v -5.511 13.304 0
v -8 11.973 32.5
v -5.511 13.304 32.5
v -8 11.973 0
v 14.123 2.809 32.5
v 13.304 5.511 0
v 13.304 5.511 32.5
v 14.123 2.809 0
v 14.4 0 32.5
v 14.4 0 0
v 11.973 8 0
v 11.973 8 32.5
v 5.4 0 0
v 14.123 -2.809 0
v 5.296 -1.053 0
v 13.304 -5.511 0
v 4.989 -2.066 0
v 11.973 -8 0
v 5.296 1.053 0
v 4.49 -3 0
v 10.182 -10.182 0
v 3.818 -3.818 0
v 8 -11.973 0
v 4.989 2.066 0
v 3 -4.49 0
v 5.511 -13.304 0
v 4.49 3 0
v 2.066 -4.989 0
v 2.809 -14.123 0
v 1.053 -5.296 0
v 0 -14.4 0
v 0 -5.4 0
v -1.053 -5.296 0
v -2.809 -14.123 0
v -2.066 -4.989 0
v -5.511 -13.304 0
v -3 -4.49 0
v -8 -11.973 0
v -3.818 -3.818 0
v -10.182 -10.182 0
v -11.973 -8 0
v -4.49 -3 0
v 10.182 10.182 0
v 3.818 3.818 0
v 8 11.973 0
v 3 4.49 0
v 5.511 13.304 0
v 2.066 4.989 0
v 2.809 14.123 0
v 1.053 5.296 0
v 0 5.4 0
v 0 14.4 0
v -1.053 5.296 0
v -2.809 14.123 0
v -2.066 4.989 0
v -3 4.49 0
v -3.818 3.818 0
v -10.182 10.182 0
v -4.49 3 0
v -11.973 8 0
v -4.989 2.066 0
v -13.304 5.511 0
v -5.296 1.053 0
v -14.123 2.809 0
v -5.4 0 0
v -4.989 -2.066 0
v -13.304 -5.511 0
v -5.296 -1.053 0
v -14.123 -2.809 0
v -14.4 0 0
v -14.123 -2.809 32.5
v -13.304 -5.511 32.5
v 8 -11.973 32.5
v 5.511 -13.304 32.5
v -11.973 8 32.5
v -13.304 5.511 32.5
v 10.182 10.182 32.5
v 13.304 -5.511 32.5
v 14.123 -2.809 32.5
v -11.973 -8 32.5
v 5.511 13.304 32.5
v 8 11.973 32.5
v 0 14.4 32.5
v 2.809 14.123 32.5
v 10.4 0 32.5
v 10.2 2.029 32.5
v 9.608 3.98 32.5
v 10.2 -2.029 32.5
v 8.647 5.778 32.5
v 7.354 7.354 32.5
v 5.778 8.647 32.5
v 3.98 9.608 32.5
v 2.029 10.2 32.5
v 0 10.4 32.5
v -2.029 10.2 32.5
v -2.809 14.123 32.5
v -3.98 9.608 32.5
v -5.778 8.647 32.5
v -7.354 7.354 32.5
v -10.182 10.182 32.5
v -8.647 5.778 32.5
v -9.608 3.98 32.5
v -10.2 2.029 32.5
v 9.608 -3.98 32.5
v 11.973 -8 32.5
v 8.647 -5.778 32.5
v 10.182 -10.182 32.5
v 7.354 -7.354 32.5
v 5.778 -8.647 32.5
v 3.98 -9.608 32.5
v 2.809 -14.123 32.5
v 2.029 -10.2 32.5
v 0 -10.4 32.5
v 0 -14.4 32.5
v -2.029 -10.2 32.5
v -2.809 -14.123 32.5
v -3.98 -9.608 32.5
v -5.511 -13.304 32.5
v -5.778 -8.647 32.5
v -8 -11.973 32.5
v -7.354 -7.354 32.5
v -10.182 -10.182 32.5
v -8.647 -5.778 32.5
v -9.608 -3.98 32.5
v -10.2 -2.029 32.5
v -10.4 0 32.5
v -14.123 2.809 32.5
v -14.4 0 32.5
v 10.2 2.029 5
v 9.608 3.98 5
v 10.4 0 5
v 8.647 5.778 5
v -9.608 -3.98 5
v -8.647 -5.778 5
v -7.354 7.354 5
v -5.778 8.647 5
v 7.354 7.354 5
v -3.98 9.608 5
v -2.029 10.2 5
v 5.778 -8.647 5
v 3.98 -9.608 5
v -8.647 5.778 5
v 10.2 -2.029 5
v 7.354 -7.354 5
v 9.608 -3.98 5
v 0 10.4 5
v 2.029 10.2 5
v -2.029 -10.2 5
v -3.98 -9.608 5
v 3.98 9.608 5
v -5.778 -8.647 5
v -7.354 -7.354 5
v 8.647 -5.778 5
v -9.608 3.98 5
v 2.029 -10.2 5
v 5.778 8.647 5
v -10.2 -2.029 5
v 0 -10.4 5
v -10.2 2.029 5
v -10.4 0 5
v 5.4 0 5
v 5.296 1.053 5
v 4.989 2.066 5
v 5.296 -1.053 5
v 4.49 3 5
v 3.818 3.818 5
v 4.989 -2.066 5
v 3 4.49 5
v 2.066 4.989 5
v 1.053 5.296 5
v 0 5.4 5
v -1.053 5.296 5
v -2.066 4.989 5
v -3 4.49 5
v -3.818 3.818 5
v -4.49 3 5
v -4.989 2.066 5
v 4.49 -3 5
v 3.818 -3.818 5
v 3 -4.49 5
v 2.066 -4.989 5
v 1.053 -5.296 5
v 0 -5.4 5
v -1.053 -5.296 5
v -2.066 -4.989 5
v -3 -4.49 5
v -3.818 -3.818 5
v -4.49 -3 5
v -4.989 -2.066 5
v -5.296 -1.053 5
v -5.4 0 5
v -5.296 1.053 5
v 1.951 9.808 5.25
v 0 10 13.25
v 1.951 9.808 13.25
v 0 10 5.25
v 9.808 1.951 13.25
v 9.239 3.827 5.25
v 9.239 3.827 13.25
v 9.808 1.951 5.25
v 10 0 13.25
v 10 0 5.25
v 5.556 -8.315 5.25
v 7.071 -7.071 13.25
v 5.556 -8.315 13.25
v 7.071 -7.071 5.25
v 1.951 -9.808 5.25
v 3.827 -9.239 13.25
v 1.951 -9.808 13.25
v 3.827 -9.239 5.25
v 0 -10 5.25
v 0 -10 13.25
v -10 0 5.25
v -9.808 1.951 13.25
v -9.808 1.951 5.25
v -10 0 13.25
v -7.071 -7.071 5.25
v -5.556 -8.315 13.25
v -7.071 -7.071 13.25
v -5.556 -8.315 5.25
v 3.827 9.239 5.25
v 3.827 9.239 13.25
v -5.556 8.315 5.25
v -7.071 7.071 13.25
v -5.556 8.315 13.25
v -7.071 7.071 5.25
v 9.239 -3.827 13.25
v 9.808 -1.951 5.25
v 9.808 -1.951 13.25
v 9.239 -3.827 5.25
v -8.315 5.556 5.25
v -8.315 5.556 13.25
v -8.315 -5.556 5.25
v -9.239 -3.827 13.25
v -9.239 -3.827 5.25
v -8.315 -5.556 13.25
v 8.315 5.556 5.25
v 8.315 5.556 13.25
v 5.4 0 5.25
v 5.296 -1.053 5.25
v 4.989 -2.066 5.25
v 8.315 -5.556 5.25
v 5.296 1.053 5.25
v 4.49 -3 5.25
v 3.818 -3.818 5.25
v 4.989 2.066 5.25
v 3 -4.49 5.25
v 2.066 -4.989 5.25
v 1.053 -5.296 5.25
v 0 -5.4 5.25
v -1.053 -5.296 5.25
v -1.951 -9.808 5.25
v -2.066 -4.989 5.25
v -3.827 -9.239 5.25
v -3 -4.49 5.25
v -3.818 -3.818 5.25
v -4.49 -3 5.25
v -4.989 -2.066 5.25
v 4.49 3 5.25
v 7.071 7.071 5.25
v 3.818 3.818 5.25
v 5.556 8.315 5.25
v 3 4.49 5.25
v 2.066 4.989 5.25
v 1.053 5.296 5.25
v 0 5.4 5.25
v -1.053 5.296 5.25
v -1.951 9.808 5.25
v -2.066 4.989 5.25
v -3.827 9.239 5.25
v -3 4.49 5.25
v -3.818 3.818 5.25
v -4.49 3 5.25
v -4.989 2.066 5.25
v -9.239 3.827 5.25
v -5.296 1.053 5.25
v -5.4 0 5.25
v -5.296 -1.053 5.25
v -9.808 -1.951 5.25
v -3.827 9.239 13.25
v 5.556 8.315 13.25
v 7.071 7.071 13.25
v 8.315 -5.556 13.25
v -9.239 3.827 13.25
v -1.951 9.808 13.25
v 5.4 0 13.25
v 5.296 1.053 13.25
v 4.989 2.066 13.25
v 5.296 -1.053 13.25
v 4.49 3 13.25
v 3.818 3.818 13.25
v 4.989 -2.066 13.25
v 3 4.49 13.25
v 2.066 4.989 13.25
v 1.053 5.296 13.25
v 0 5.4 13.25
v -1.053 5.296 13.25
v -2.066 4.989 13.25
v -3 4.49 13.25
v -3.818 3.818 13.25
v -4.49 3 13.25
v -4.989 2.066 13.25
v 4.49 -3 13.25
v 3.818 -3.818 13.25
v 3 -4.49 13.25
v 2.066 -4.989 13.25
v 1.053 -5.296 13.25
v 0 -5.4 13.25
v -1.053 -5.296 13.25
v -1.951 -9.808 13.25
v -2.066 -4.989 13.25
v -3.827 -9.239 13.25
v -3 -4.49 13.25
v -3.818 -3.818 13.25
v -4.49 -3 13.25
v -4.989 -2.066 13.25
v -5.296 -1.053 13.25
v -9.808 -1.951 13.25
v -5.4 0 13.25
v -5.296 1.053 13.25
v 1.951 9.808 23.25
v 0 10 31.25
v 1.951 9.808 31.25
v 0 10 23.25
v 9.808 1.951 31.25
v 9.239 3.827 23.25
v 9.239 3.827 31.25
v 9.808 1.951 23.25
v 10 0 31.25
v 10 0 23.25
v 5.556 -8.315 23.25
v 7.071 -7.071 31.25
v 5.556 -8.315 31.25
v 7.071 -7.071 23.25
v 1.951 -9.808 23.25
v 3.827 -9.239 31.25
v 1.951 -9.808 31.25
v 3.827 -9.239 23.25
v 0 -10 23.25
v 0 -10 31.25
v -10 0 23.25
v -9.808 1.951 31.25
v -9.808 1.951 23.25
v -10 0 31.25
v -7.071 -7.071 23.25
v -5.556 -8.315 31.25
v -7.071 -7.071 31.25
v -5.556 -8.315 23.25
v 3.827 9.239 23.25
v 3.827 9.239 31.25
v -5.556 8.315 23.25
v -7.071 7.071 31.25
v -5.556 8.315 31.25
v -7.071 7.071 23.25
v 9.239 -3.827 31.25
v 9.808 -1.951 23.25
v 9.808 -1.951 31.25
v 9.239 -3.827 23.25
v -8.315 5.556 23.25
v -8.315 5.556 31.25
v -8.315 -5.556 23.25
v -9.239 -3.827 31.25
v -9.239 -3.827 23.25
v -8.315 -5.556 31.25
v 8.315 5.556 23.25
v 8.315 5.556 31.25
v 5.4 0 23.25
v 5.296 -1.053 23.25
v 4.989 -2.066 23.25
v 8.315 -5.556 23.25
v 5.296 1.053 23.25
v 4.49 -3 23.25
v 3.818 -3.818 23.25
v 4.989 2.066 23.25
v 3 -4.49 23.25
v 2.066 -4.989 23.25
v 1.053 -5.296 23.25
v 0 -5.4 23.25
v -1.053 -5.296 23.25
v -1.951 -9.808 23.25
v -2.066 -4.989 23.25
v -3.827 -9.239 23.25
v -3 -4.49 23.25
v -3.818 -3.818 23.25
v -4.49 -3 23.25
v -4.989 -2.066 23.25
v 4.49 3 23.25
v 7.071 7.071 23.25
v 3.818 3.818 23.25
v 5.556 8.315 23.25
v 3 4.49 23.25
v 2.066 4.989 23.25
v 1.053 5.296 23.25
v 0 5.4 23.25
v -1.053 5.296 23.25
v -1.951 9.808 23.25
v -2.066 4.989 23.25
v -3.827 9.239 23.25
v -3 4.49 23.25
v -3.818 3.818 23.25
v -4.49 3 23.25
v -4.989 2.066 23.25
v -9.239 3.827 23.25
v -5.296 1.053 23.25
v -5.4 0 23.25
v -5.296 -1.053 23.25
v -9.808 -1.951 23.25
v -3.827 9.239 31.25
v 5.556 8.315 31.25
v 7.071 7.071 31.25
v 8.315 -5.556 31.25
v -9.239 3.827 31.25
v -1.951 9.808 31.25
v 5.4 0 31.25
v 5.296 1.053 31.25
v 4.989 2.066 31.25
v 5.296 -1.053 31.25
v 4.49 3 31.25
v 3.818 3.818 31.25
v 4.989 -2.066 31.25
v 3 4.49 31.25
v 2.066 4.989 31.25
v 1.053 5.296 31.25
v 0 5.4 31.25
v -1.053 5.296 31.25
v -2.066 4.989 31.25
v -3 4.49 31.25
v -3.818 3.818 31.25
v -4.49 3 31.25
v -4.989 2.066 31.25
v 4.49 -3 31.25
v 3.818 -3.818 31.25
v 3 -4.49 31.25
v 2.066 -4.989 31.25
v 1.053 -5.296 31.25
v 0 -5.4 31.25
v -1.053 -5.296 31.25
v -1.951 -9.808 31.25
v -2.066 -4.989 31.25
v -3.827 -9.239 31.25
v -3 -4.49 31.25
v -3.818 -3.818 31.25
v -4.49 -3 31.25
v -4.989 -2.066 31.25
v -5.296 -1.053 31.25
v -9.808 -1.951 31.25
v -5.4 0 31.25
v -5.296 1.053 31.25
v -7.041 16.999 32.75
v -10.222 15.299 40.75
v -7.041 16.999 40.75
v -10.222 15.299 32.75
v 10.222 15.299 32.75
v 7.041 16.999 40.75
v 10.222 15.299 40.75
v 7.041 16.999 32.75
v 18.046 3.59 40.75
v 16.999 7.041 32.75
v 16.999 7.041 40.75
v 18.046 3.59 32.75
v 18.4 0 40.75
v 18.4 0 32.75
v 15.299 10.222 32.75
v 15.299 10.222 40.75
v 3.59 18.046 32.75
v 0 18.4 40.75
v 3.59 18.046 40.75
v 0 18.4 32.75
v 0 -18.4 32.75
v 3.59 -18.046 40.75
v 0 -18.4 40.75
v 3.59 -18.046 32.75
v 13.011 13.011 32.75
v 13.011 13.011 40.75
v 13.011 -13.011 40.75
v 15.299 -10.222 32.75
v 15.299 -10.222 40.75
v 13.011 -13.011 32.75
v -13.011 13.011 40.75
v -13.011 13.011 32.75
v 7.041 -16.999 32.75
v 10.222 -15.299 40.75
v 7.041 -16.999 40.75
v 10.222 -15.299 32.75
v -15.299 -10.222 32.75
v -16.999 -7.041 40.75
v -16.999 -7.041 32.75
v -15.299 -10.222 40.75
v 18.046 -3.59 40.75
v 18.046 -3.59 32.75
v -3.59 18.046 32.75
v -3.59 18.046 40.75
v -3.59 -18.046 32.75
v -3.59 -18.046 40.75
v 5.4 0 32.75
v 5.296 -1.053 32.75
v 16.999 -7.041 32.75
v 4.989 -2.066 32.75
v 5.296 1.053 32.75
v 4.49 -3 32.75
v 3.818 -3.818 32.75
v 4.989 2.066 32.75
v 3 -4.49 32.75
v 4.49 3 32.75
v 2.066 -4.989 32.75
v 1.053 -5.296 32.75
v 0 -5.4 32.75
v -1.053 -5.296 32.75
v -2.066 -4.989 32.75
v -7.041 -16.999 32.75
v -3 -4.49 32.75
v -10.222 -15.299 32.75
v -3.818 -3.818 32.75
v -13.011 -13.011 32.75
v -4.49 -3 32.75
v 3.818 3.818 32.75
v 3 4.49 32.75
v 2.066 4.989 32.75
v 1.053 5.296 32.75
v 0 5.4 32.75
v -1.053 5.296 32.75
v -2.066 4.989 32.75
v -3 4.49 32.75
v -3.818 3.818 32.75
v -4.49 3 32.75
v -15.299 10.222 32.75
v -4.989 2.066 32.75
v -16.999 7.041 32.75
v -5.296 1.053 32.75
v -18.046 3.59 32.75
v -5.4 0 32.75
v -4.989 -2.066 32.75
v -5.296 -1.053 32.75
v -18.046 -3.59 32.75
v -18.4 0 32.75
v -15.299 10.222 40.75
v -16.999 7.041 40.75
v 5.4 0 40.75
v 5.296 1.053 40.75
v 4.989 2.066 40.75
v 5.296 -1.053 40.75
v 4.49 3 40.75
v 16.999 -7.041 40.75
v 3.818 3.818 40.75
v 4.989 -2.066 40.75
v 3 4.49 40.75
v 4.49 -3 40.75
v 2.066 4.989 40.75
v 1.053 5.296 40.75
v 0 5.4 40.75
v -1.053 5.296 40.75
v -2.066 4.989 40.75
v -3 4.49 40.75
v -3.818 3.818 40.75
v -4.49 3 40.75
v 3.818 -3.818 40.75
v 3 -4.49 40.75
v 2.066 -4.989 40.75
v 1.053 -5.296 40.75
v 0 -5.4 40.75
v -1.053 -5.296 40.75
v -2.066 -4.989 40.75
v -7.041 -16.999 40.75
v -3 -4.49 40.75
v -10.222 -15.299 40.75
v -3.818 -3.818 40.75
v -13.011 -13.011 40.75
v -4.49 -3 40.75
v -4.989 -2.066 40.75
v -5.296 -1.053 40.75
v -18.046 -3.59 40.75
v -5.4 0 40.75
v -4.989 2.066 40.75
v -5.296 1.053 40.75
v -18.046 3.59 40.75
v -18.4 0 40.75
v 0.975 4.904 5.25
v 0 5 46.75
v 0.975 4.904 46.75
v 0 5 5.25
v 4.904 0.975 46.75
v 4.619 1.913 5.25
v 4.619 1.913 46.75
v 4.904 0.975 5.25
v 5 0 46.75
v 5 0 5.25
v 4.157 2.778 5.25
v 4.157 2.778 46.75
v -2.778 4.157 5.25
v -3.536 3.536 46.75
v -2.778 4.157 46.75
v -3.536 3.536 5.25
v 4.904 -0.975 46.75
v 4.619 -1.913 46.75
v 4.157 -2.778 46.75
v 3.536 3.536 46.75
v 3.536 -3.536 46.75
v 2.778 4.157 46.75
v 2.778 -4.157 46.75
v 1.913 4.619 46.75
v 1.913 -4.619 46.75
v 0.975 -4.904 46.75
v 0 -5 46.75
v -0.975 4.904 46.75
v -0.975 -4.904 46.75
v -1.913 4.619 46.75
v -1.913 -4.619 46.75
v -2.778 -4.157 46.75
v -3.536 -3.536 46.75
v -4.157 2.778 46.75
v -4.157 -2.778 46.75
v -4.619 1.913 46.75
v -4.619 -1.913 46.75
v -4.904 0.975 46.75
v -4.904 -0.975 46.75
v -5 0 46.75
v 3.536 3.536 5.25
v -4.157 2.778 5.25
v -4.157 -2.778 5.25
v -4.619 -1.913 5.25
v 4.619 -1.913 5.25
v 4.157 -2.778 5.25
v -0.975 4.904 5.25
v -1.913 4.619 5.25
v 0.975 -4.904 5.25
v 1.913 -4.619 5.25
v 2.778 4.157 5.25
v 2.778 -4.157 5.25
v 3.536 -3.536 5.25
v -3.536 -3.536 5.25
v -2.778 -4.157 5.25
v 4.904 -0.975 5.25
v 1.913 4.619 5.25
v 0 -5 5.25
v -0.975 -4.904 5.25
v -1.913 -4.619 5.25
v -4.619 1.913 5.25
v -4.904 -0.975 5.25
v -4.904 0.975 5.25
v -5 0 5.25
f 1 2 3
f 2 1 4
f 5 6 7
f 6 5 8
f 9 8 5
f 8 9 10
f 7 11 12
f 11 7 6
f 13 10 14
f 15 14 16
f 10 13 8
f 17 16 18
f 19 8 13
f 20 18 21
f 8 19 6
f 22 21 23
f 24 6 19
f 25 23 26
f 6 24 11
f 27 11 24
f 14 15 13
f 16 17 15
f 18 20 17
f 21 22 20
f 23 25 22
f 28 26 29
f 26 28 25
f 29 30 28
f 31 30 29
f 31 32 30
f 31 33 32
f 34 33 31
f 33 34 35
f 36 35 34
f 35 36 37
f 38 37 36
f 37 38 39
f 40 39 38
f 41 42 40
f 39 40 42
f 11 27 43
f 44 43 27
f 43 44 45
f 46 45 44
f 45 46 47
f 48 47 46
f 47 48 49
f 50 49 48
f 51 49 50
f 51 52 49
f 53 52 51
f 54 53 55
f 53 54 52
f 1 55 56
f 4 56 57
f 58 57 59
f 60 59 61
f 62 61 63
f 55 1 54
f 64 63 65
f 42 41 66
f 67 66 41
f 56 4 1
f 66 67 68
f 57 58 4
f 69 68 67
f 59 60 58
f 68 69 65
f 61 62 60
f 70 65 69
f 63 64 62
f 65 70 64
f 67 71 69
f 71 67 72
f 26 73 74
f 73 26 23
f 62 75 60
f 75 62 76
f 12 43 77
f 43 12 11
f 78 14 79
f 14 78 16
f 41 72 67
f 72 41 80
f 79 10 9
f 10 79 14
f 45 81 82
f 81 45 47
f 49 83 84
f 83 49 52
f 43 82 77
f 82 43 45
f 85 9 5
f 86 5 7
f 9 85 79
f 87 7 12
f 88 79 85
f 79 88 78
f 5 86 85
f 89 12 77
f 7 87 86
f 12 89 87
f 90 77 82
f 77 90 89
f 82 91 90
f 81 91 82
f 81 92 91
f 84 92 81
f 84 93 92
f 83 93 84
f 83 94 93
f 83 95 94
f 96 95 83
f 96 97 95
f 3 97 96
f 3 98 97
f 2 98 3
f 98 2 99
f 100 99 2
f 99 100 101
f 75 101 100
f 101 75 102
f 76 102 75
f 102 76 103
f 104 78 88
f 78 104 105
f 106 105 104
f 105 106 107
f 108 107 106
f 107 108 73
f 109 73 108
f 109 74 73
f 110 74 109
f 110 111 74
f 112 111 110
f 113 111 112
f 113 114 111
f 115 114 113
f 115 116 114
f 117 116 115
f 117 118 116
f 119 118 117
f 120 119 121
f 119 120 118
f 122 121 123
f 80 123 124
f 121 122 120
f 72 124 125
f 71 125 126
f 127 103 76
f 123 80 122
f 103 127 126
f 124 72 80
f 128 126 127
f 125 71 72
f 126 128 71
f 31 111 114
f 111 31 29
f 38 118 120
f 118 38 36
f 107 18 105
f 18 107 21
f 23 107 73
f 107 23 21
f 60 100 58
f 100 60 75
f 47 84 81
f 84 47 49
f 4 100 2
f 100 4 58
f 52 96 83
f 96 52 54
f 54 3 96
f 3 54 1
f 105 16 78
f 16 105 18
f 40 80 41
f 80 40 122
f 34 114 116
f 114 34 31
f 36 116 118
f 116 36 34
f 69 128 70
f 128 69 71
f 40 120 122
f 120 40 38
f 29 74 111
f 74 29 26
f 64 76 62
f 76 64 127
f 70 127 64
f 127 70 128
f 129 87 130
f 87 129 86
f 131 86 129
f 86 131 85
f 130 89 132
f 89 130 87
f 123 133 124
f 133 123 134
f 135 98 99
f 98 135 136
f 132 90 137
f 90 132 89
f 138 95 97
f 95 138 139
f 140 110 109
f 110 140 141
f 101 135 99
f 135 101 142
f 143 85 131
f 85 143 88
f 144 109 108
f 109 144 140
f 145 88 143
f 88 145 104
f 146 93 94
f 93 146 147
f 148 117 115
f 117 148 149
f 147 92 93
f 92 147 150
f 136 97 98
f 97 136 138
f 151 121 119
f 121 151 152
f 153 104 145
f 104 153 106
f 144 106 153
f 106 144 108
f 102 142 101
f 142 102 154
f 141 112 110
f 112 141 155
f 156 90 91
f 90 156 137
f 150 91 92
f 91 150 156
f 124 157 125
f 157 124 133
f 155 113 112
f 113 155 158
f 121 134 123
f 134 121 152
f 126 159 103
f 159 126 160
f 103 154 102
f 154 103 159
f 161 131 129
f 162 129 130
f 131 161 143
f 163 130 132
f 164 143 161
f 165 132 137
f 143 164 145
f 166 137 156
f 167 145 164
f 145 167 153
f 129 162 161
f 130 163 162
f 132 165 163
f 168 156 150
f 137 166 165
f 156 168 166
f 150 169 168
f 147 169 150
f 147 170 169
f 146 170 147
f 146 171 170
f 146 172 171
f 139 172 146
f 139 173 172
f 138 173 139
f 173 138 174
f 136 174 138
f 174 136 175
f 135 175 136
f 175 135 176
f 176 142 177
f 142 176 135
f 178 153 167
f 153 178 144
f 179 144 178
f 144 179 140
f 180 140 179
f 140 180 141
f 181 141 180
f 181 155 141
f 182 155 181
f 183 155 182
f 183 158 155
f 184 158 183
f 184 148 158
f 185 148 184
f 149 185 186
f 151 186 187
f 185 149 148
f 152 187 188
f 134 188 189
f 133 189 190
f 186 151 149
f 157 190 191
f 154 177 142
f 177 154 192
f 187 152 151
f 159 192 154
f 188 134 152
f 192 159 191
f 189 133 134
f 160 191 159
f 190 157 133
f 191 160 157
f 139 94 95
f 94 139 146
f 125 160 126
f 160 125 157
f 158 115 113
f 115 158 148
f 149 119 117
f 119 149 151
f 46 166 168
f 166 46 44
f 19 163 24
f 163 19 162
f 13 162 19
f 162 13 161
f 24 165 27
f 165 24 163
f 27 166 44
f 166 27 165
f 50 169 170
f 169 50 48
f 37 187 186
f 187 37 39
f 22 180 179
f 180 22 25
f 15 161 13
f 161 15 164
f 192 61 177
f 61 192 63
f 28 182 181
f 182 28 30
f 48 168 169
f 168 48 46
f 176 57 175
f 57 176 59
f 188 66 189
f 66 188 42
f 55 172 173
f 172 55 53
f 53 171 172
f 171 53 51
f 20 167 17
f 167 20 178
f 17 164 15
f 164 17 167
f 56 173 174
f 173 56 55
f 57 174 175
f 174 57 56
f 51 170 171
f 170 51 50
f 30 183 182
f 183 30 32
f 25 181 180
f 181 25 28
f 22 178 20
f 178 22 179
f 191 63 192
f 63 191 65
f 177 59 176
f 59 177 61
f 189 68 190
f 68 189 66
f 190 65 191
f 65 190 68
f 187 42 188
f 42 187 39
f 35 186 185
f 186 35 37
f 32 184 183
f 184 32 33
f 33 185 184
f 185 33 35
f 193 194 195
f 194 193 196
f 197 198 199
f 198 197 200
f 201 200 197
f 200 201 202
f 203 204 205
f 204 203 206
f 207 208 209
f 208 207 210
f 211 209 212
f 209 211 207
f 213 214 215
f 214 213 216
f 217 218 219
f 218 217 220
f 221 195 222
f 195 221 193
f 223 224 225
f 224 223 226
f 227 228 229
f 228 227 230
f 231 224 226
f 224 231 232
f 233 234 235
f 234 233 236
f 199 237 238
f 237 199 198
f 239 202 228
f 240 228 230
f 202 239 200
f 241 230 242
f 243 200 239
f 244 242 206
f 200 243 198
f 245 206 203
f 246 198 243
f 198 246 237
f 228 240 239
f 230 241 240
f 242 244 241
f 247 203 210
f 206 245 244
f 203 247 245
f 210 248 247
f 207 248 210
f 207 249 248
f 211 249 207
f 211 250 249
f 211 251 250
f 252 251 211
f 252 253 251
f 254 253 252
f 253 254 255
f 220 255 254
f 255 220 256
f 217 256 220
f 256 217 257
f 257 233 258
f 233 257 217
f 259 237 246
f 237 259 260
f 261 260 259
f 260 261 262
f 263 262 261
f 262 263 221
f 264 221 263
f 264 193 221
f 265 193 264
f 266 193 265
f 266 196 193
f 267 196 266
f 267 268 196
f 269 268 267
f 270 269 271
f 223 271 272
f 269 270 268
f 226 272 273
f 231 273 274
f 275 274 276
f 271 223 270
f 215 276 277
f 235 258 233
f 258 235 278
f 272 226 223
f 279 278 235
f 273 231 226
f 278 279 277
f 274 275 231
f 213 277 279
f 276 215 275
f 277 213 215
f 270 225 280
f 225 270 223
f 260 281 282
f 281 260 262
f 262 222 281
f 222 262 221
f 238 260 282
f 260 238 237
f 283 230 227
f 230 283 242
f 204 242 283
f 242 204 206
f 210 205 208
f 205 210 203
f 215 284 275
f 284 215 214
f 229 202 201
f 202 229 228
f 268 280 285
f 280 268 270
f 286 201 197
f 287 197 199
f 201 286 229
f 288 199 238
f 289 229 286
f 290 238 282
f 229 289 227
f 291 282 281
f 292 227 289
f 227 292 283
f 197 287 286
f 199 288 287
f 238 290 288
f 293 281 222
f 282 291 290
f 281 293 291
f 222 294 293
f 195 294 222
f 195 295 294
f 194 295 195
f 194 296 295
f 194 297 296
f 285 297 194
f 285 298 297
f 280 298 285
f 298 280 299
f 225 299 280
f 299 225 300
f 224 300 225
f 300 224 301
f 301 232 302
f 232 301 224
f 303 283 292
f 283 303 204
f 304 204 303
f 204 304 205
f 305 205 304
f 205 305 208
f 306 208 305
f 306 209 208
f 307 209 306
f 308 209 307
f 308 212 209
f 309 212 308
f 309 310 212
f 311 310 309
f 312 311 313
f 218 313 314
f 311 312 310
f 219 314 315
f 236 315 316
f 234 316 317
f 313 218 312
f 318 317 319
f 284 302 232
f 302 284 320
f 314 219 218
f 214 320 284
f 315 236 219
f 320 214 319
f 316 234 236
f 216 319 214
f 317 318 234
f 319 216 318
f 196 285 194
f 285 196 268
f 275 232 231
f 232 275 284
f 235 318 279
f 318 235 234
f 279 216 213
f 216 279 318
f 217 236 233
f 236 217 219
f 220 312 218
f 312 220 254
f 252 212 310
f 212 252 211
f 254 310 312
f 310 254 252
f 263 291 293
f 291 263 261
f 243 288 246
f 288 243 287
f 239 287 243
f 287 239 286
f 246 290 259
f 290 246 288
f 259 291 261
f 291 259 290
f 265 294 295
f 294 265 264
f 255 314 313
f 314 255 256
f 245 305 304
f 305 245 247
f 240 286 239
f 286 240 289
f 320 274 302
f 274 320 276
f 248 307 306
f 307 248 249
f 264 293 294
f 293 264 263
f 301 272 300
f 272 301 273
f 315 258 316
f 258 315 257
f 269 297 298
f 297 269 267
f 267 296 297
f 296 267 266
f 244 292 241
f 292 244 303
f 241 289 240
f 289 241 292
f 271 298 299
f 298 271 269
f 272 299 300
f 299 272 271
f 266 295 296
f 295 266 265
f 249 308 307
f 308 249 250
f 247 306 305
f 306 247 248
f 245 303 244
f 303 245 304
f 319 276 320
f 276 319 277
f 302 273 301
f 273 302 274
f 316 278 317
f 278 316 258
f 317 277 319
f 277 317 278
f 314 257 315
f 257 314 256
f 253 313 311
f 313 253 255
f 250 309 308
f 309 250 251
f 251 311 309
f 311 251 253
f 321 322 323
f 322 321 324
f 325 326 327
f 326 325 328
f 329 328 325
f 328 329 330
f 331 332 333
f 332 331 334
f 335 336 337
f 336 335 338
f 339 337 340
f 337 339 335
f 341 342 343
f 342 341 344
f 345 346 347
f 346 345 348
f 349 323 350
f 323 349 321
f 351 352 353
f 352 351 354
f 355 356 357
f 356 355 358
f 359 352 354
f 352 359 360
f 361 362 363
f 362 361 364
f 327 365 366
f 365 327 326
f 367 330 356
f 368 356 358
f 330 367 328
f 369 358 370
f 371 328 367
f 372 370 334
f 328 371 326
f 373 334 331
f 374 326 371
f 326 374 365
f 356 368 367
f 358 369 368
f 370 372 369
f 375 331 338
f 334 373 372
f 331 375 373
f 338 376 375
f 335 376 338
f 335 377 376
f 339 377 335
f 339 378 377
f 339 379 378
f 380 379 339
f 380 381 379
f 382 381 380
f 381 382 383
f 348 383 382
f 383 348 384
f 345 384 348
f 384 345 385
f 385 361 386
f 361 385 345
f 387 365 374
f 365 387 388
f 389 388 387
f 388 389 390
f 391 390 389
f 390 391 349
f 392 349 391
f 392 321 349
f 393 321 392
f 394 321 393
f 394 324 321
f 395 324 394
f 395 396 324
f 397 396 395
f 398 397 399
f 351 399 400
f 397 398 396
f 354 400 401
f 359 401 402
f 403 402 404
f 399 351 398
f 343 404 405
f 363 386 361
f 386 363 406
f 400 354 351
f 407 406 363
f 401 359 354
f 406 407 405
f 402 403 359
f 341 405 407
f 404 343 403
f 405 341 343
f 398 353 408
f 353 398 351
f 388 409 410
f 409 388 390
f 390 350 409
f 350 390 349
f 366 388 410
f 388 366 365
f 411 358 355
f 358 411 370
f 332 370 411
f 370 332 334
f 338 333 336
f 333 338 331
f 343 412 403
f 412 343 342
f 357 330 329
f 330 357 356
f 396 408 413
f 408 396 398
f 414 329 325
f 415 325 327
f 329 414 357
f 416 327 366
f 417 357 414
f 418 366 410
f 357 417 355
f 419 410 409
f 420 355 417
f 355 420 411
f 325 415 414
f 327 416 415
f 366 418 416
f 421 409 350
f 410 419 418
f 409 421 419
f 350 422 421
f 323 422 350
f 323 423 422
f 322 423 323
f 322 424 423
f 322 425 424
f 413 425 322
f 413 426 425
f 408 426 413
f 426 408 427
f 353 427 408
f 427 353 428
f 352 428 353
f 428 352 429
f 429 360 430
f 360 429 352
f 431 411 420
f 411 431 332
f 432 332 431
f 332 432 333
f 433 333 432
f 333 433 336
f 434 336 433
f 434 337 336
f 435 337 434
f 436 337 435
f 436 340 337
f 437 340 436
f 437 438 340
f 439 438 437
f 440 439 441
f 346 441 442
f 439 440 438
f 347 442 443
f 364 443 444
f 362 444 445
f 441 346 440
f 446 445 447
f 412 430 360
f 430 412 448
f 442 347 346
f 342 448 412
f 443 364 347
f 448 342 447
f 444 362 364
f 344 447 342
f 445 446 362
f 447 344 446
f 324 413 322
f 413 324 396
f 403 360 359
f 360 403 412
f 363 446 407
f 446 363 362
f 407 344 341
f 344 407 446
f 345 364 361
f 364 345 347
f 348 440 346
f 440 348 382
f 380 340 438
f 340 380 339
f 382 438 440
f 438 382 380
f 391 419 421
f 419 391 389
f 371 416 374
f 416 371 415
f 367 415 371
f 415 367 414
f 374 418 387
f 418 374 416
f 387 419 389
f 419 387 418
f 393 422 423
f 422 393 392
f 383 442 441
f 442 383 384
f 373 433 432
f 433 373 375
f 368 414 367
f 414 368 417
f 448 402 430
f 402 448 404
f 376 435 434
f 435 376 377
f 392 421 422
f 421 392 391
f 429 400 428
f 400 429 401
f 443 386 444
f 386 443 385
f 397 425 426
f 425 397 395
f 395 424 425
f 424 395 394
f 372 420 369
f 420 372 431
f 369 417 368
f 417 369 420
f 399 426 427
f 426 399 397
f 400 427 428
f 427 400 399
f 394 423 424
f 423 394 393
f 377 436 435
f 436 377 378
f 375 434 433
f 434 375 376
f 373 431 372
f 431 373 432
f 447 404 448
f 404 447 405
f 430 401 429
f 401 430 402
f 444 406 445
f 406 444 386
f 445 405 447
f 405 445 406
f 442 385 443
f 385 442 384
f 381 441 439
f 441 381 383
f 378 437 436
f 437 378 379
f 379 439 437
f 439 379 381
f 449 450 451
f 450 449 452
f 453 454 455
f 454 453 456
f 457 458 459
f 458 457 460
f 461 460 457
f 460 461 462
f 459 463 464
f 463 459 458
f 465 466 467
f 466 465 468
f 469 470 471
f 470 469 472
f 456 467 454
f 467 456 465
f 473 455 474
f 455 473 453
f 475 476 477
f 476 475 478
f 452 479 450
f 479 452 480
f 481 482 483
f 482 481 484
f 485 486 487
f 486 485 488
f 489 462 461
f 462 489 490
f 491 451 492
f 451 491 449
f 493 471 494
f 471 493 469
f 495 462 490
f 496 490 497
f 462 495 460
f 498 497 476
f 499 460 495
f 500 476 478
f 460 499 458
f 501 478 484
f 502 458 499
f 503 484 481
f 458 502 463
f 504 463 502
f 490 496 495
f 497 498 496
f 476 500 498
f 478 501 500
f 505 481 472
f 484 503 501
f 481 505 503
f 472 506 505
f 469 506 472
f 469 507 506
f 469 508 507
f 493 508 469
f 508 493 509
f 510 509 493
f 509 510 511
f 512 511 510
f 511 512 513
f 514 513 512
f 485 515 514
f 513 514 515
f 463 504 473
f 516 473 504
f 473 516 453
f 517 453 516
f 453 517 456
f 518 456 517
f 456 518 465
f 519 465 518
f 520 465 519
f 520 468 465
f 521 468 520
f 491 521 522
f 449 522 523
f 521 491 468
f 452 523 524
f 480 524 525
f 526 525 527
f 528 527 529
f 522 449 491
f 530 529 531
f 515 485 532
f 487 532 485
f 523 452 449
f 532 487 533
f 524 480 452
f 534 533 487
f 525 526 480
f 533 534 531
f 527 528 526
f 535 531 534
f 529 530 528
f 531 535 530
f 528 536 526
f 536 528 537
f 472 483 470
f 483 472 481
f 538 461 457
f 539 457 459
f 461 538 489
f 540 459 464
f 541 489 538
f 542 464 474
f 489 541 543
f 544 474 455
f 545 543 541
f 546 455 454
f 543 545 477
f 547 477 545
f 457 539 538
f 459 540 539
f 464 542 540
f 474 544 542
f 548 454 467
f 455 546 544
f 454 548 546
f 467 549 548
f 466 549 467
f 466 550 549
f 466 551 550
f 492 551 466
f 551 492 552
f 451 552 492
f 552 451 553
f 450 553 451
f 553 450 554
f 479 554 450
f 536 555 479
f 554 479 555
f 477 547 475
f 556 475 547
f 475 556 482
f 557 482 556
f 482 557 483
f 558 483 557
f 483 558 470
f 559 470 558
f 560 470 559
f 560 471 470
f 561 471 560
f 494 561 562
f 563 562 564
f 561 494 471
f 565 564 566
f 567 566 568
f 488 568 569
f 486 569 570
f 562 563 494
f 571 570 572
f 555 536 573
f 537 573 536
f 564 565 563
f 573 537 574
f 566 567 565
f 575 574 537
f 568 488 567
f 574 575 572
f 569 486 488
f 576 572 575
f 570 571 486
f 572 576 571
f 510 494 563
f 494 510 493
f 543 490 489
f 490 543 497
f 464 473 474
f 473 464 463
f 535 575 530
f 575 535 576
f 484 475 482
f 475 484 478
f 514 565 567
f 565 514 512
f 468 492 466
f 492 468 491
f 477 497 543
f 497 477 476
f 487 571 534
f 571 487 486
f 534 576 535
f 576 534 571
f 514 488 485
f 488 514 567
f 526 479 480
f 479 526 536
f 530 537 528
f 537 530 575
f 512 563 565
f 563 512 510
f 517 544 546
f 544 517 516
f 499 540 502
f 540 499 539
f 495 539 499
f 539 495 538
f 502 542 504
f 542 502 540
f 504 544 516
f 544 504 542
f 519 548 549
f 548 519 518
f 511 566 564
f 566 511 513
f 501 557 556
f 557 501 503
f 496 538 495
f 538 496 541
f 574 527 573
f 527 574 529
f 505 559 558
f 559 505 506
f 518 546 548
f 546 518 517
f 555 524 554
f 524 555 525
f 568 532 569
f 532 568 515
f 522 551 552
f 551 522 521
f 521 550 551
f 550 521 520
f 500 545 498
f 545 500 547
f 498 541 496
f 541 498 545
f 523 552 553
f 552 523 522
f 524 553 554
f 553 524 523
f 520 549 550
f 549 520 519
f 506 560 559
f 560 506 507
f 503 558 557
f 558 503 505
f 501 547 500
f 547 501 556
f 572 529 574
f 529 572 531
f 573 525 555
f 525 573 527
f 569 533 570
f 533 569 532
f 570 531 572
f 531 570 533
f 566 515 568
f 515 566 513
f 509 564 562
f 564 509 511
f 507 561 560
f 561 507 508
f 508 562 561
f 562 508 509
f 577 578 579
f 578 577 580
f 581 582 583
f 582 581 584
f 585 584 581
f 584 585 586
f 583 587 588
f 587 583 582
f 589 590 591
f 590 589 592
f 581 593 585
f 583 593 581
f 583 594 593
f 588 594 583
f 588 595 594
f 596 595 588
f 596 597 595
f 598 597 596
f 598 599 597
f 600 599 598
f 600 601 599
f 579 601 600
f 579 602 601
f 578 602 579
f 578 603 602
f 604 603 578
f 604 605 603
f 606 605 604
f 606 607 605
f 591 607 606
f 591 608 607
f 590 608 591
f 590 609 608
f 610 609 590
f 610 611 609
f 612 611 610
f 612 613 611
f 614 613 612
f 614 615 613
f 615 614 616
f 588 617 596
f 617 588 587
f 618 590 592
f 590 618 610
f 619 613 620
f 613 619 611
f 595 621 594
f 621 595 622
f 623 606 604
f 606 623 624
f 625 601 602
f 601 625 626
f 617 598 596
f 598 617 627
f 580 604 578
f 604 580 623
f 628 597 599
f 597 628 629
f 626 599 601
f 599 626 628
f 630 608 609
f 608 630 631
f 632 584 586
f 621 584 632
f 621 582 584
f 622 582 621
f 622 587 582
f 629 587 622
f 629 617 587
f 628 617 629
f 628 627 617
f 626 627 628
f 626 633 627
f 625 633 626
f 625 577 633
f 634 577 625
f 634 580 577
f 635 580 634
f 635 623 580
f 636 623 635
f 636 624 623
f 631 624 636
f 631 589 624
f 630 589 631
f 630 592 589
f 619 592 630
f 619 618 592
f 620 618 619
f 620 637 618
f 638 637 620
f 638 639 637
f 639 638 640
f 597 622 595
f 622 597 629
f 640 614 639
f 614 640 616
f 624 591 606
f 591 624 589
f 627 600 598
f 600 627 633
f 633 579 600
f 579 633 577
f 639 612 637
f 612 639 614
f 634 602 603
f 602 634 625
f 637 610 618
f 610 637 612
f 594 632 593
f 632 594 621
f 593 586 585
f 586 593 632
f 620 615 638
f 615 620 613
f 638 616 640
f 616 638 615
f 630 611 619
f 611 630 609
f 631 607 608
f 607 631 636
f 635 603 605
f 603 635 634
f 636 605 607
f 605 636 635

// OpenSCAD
$fn = 32;

// ------------------------------------------------------------------------
// Shaft station: cup d28.8 x 32.5 mm, shaft d10
// Every part is its own module, assembly() places every instance.
// ------------------------------------------------------------------------

// --- part 1 ---
module housing_cup() {
  difference() {
    cylinder(h = 32.5, d = 28.8);
    translate([0, 0, 5]) cylinder(h = 28.5, d = 20.8);
    translate([0, 0, -1]) cylinder(h = 7, d = 10.8);
  }
}

// --- part 2 ---
module bearing_lower() {
  difference() {
      translate([0, 0, 0]) cylinder(h = 8, d = 20);
      translate([0, 0, -1]) cylinder(h = 10, d = 10.8);
    }
}

// --- part 3 ---
module bearing_upper() {
  difference() {
      translate([0, 0, 0]) cylinder(h = 8, d = 20);
      translate([0, 0, -1]) cylinder(h = 10, d = 10.8);
    }
}

// --- part 4 ---
module station_shaft() {
  translate([0, 0, -20.75]) cylinder(h = 41.5, d = 10);
}

// --- part 5 ---
module station_cover() {
  difference() {
    cylinder(h = 8, d = 36.8);
    translate([0, 0, -1]) cylinder(h = 10, d = 10.8);
  }
}

// --- assembly ---
module assembly() {
  color([0.80, 0.24, 0.20]) translate([0, 0, 0]) rotate([0, 0, 0]) housing_cup();
  color([0.20, 0.45, 0.75]) translate([0, 0, 5.25]) rotate([0, 0, 0]) bearing_lower();
  color([0.25, 0.62, 0.32]) translate([0, 0, 23.25]) rotate([0, 0, 0]) bearing_upper();
  color([0.92, 0.70, 0.18]) translate([0, 0, 26]) rotate([0, 0, 0]) station_shaft();
  color([0.58, 0.35, 0.70]) translate([0, 0, 32.75]) rotate([0, 0, 0]) station_cover();
}

assembly();
